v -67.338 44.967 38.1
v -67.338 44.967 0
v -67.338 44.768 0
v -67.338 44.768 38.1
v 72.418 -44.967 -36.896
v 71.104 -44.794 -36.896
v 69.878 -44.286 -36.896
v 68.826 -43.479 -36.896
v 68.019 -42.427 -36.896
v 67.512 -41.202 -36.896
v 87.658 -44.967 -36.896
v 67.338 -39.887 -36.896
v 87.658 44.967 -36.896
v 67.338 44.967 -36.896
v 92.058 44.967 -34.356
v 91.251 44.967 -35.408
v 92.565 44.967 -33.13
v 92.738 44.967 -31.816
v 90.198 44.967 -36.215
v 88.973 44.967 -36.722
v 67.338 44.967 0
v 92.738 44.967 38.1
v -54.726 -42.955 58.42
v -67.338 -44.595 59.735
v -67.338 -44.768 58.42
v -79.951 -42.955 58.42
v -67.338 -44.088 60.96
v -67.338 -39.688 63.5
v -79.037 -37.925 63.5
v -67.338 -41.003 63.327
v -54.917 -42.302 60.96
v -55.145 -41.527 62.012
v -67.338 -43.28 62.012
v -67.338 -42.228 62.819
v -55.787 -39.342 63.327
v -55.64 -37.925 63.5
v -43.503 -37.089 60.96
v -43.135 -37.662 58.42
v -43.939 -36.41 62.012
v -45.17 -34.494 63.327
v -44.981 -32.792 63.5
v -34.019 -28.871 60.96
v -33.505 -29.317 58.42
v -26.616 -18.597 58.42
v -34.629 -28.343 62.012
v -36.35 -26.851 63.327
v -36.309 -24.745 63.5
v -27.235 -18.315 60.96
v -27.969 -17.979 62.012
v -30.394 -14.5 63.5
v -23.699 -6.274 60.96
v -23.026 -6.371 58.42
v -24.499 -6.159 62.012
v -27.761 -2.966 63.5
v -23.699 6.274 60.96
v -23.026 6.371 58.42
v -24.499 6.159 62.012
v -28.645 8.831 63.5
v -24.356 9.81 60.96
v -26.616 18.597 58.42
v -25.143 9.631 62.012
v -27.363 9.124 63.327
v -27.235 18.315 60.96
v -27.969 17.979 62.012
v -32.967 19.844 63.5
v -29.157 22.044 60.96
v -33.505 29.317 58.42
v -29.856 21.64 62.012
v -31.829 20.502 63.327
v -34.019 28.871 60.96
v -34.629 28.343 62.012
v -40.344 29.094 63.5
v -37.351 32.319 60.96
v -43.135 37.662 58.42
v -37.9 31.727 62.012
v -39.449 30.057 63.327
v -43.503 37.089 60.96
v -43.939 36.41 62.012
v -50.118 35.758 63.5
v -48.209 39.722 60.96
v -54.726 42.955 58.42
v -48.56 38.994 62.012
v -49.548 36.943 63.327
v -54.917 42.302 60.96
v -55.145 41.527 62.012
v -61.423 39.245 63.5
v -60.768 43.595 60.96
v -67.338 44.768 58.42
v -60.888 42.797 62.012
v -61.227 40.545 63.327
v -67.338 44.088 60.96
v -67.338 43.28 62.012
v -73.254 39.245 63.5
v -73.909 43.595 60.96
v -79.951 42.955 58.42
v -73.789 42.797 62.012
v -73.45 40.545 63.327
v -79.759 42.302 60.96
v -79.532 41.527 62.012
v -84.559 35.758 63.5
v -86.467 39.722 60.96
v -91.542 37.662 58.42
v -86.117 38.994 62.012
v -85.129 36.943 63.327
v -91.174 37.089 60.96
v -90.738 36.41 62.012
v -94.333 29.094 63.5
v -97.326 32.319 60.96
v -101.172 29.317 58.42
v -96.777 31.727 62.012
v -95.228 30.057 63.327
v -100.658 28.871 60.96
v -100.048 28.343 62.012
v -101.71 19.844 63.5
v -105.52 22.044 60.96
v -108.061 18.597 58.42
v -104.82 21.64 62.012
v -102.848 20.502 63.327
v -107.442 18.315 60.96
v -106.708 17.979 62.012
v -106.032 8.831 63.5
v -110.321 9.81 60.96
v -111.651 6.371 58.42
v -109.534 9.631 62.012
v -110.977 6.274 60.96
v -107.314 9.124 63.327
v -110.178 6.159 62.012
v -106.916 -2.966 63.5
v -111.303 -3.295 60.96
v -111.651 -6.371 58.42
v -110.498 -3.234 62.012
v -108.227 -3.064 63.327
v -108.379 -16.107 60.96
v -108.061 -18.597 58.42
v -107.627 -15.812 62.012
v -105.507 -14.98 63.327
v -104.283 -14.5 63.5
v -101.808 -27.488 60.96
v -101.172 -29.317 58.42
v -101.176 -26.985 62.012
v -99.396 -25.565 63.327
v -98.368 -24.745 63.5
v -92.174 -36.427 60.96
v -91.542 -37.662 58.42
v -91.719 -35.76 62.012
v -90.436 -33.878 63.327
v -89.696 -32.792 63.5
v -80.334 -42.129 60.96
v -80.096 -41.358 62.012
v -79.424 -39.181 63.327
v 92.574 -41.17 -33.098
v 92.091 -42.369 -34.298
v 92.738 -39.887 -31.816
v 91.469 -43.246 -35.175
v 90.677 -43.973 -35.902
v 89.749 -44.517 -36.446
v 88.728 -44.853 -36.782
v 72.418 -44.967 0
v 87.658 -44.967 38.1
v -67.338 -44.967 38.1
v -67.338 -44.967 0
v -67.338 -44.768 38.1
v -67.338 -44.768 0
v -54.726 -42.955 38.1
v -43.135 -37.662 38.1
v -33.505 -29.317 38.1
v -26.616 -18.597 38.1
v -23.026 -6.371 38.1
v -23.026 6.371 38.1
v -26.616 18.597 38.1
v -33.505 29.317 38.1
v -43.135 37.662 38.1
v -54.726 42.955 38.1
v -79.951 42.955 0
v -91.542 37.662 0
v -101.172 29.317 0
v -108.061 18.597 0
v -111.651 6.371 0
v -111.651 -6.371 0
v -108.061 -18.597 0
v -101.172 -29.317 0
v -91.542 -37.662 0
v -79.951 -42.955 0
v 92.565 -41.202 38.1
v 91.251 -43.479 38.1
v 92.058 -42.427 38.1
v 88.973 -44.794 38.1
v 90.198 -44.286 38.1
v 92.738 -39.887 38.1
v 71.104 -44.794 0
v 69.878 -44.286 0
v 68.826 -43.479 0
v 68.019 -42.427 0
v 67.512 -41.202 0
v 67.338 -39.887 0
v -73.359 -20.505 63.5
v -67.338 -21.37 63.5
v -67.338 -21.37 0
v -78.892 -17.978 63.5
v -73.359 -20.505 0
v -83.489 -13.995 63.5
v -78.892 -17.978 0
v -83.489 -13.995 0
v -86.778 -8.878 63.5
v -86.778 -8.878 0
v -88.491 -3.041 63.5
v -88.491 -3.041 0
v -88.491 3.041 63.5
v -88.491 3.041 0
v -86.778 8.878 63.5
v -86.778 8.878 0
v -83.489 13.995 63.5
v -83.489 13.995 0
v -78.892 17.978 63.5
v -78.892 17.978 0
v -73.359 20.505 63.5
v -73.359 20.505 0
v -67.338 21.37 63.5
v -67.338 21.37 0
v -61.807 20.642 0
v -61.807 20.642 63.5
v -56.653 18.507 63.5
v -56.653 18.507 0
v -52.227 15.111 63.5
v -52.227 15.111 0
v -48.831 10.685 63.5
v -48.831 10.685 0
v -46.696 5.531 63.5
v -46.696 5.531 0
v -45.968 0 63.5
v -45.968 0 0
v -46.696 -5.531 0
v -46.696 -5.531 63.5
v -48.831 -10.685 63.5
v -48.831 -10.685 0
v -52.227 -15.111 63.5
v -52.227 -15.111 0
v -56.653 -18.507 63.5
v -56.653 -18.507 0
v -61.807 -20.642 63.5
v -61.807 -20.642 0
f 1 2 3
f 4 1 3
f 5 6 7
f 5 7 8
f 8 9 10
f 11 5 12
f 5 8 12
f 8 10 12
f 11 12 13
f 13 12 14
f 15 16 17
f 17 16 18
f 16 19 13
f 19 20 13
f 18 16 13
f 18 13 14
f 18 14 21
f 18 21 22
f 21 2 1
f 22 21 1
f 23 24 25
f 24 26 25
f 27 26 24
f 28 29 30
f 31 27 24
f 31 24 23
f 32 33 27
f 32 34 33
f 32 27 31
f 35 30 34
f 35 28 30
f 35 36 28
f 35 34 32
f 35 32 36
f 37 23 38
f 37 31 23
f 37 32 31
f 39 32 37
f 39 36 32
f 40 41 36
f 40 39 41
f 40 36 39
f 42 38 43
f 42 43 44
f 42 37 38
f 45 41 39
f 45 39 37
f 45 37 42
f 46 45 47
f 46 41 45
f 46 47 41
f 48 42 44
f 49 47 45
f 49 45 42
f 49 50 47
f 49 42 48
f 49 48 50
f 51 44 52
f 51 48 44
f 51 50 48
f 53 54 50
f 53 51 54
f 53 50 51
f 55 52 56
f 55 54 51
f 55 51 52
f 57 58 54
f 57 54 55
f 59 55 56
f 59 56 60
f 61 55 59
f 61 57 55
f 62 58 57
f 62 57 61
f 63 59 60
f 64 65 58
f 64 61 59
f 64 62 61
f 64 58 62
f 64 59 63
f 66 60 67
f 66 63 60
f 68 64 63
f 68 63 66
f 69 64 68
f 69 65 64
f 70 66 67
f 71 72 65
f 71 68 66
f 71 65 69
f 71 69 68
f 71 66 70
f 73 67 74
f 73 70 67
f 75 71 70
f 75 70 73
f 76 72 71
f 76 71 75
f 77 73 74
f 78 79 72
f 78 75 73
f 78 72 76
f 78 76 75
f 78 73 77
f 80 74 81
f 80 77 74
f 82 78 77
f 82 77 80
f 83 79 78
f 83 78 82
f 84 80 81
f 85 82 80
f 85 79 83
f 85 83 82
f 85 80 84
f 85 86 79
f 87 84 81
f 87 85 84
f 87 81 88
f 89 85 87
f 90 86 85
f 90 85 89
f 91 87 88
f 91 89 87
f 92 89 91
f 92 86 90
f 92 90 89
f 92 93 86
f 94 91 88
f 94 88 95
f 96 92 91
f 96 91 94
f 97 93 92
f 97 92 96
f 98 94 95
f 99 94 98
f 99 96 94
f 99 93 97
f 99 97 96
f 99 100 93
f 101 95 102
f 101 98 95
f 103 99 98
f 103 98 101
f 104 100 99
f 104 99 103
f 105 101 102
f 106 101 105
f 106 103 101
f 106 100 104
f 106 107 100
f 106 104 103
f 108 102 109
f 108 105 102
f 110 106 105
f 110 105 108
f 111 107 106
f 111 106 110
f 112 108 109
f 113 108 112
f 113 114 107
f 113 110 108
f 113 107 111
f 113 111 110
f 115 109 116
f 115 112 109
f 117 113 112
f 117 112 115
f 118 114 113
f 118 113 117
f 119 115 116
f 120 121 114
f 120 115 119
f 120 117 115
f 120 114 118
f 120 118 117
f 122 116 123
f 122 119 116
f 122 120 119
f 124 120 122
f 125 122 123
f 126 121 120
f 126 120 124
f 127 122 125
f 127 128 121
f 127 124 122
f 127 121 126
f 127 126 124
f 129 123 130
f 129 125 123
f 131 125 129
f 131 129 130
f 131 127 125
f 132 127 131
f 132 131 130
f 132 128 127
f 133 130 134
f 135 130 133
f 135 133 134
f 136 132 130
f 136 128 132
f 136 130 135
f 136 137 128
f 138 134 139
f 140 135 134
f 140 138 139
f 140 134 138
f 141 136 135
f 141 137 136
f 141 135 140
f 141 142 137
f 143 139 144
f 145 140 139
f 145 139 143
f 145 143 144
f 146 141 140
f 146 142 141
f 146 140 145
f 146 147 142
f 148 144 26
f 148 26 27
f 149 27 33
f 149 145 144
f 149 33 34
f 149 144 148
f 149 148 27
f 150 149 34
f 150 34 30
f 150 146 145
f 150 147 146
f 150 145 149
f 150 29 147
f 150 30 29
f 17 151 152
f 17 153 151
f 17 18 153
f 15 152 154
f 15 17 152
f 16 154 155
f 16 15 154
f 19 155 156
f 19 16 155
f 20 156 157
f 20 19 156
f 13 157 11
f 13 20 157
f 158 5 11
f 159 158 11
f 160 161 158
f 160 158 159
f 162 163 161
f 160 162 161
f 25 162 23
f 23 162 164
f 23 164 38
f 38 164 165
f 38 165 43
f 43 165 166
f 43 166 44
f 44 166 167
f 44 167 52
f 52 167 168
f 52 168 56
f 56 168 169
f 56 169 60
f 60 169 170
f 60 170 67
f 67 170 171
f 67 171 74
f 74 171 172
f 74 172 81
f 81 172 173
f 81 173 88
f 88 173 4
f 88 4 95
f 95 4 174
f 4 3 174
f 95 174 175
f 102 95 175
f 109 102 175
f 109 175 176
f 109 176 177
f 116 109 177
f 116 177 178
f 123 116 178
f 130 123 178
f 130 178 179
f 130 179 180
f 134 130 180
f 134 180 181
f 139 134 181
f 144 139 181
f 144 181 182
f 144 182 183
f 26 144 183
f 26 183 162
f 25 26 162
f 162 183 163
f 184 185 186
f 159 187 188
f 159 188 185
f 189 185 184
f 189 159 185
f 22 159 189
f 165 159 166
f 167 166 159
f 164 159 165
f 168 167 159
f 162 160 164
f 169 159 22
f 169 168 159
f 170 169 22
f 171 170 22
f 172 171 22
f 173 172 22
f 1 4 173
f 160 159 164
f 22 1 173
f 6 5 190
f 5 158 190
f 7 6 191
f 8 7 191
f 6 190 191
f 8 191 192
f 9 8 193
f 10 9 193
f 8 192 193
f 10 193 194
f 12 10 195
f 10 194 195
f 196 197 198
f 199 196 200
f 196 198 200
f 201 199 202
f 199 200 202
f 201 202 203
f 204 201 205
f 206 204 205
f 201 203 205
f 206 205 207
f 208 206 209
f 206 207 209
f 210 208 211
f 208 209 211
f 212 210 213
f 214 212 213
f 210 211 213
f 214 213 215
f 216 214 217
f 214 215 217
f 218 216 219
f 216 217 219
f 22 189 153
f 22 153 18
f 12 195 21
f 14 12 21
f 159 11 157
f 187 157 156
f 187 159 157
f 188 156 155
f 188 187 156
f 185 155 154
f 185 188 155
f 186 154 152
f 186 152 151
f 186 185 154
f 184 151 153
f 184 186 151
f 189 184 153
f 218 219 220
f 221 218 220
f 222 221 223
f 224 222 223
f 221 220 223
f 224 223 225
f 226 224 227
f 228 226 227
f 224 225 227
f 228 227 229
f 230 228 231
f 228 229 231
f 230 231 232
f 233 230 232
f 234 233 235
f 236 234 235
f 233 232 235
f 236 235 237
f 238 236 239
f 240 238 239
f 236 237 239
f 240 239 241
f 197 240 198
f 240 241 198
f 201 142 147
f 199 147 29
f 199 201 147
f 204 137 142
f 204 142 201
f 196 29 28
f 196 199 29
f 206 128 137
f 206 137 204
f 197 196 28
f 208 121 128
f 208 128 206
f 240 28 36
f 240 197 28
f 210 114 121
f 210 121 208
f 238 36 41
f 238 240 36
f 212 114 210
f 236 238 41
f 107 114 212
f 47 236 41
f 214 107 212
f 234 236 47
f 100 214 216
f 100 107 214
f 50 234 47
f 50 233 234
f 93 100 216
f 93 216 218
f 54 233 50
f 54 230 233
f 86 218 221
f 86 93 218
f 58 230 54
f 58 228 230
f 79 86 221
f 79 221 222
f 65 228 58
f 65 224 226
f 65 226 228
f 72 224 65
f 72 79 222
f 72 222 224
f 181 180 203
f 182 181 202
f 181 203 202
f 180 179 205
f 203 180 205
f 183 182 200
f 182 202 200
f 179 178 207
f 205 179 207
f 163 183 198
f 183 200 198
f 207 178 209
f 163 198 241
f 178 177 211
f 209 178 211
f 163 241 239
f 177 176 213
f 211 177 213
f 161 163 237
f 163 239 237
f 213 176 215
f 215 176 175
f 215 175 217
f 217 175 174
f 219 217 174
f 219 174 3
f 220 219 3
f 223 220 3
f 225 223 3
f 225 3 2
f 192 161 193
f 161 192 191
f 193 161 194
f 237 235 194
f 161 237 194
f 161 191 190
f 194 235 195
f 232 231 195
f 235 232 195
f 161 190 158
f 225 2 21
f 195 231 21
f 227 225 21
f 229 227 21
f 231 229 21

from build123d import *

# Parameters (mm, degrees)
F1_DEPTH = 38.1
F2_DEPTH = 63.5
F3_R     = 5.08
F4_W     = 89.9337530136
F4_H     = 74.9955805898
F5_DEPTH = 25.4
F6_R     = 5.08


with BuildPart() as f1:
    # F0 (on Top) → F1 (new body)
    with BuildSketch(Plane.XY):
        with BuildLine():
            Line((67.3384442925, 44.9668765068), (-67.3384442925, 44.9668765068))
            Line((-67.3384442925, 44.9668765068), (-67.3384442925, 44.7683221654))
            ThreePointArc((-67.3384442925, 44.7683221654), (-35.682460107, 31.6559841855), (-22.5701221271, 0))
            ThreePointArc((-22.5701221271, 0), (-35.682460107, -31.6559841855), (-67.3384442925, -44.7683221654))
            Line((-67.3384442925, -44.7683221654), (-67.3384442925, -44.9668765068))
            Line((-67.3384442925, -44.9668765068), (67.3384442925, -44.9668765068))
            Line((67.3384442925, -44.9668765068), (67.3384442925, 44.9668765068))
        make_face()
    extrude(amount=F1_DEPTH)

    # F0 (on Top) → F2 (join)
    with BuildSketch(Plane.XY):
        with BuildLine():
            Line((-67.3384442925, 21.3704215864), (-67.3384442925, 44.7683221654))
            ThreePointArc((-67.3384442925, 44.7683221654), (-112.1067664579, 0), (-67.3384442925, -44.7683221654))
            Line((-67.3384442925, -44.7683221654), (-67.3384442925, -21.3704215864))
            ThreePointArc((-67.3384442925, -21.3704215864), (-88.7088658789, 0), (-67.3384442925, 21.3704215864))
        make_face()
        with BuildLine():
            ThreePointArc((-22.5701221271, 0), (-35.682460107, 31.6559841855), (-67.3384442925, 44.7683221654))
            Line((-67.3384442925, 44.7683221654), (-67.3384442925, 21.3704215864))
            ThreePointArc((-67.3384442925, 21.3704215864), (-52.227274272, 15.1111700206), (-45.9680227061, 0))
            ThreePointArc((-45.9680227061, 0), (-52.227274272, -15.1111700206), (-67.3384442925, -21.3704215864))
            Line((-67.3384442925, -21.3704215864), (-67.3384442925, -44.7683221654))
            ThreePointArc((-67.3384442925, -44.7683221654), (-35.682460107, -31.6559841855), (-22.5701221271, 0))
        make_face()
    extrude(amount=F2_DEPTH)

    # F3
    f3_edges = [f1.edges().sort_by_distance(p)[0] for p in [
        (-67.338444, 44.768322, 63.5),
    ]]
    fillet(f3_edges, radius=F3_R)

    # F4 (on face) → F5 (join)
    with BuildSketch(Plane.YZ.offset(67.3384442925)):
        with Locations((0, 0.6022097051)):
            Rectangle(F4_W, F4_H)
    extrude(amount=F5_DEPTH)

    # F6
    f6_edges = [f1.edges().sort_by_distance(p)[0] for p in [
        (92.738444, -44.966877, 0.60221),
        (67.338444, -44.966877, -18.44779),
        (92.738444, 0, -36.895581),
    ]]
    fillet(f6_edges, radius=F6_R)


solid = f1.part
